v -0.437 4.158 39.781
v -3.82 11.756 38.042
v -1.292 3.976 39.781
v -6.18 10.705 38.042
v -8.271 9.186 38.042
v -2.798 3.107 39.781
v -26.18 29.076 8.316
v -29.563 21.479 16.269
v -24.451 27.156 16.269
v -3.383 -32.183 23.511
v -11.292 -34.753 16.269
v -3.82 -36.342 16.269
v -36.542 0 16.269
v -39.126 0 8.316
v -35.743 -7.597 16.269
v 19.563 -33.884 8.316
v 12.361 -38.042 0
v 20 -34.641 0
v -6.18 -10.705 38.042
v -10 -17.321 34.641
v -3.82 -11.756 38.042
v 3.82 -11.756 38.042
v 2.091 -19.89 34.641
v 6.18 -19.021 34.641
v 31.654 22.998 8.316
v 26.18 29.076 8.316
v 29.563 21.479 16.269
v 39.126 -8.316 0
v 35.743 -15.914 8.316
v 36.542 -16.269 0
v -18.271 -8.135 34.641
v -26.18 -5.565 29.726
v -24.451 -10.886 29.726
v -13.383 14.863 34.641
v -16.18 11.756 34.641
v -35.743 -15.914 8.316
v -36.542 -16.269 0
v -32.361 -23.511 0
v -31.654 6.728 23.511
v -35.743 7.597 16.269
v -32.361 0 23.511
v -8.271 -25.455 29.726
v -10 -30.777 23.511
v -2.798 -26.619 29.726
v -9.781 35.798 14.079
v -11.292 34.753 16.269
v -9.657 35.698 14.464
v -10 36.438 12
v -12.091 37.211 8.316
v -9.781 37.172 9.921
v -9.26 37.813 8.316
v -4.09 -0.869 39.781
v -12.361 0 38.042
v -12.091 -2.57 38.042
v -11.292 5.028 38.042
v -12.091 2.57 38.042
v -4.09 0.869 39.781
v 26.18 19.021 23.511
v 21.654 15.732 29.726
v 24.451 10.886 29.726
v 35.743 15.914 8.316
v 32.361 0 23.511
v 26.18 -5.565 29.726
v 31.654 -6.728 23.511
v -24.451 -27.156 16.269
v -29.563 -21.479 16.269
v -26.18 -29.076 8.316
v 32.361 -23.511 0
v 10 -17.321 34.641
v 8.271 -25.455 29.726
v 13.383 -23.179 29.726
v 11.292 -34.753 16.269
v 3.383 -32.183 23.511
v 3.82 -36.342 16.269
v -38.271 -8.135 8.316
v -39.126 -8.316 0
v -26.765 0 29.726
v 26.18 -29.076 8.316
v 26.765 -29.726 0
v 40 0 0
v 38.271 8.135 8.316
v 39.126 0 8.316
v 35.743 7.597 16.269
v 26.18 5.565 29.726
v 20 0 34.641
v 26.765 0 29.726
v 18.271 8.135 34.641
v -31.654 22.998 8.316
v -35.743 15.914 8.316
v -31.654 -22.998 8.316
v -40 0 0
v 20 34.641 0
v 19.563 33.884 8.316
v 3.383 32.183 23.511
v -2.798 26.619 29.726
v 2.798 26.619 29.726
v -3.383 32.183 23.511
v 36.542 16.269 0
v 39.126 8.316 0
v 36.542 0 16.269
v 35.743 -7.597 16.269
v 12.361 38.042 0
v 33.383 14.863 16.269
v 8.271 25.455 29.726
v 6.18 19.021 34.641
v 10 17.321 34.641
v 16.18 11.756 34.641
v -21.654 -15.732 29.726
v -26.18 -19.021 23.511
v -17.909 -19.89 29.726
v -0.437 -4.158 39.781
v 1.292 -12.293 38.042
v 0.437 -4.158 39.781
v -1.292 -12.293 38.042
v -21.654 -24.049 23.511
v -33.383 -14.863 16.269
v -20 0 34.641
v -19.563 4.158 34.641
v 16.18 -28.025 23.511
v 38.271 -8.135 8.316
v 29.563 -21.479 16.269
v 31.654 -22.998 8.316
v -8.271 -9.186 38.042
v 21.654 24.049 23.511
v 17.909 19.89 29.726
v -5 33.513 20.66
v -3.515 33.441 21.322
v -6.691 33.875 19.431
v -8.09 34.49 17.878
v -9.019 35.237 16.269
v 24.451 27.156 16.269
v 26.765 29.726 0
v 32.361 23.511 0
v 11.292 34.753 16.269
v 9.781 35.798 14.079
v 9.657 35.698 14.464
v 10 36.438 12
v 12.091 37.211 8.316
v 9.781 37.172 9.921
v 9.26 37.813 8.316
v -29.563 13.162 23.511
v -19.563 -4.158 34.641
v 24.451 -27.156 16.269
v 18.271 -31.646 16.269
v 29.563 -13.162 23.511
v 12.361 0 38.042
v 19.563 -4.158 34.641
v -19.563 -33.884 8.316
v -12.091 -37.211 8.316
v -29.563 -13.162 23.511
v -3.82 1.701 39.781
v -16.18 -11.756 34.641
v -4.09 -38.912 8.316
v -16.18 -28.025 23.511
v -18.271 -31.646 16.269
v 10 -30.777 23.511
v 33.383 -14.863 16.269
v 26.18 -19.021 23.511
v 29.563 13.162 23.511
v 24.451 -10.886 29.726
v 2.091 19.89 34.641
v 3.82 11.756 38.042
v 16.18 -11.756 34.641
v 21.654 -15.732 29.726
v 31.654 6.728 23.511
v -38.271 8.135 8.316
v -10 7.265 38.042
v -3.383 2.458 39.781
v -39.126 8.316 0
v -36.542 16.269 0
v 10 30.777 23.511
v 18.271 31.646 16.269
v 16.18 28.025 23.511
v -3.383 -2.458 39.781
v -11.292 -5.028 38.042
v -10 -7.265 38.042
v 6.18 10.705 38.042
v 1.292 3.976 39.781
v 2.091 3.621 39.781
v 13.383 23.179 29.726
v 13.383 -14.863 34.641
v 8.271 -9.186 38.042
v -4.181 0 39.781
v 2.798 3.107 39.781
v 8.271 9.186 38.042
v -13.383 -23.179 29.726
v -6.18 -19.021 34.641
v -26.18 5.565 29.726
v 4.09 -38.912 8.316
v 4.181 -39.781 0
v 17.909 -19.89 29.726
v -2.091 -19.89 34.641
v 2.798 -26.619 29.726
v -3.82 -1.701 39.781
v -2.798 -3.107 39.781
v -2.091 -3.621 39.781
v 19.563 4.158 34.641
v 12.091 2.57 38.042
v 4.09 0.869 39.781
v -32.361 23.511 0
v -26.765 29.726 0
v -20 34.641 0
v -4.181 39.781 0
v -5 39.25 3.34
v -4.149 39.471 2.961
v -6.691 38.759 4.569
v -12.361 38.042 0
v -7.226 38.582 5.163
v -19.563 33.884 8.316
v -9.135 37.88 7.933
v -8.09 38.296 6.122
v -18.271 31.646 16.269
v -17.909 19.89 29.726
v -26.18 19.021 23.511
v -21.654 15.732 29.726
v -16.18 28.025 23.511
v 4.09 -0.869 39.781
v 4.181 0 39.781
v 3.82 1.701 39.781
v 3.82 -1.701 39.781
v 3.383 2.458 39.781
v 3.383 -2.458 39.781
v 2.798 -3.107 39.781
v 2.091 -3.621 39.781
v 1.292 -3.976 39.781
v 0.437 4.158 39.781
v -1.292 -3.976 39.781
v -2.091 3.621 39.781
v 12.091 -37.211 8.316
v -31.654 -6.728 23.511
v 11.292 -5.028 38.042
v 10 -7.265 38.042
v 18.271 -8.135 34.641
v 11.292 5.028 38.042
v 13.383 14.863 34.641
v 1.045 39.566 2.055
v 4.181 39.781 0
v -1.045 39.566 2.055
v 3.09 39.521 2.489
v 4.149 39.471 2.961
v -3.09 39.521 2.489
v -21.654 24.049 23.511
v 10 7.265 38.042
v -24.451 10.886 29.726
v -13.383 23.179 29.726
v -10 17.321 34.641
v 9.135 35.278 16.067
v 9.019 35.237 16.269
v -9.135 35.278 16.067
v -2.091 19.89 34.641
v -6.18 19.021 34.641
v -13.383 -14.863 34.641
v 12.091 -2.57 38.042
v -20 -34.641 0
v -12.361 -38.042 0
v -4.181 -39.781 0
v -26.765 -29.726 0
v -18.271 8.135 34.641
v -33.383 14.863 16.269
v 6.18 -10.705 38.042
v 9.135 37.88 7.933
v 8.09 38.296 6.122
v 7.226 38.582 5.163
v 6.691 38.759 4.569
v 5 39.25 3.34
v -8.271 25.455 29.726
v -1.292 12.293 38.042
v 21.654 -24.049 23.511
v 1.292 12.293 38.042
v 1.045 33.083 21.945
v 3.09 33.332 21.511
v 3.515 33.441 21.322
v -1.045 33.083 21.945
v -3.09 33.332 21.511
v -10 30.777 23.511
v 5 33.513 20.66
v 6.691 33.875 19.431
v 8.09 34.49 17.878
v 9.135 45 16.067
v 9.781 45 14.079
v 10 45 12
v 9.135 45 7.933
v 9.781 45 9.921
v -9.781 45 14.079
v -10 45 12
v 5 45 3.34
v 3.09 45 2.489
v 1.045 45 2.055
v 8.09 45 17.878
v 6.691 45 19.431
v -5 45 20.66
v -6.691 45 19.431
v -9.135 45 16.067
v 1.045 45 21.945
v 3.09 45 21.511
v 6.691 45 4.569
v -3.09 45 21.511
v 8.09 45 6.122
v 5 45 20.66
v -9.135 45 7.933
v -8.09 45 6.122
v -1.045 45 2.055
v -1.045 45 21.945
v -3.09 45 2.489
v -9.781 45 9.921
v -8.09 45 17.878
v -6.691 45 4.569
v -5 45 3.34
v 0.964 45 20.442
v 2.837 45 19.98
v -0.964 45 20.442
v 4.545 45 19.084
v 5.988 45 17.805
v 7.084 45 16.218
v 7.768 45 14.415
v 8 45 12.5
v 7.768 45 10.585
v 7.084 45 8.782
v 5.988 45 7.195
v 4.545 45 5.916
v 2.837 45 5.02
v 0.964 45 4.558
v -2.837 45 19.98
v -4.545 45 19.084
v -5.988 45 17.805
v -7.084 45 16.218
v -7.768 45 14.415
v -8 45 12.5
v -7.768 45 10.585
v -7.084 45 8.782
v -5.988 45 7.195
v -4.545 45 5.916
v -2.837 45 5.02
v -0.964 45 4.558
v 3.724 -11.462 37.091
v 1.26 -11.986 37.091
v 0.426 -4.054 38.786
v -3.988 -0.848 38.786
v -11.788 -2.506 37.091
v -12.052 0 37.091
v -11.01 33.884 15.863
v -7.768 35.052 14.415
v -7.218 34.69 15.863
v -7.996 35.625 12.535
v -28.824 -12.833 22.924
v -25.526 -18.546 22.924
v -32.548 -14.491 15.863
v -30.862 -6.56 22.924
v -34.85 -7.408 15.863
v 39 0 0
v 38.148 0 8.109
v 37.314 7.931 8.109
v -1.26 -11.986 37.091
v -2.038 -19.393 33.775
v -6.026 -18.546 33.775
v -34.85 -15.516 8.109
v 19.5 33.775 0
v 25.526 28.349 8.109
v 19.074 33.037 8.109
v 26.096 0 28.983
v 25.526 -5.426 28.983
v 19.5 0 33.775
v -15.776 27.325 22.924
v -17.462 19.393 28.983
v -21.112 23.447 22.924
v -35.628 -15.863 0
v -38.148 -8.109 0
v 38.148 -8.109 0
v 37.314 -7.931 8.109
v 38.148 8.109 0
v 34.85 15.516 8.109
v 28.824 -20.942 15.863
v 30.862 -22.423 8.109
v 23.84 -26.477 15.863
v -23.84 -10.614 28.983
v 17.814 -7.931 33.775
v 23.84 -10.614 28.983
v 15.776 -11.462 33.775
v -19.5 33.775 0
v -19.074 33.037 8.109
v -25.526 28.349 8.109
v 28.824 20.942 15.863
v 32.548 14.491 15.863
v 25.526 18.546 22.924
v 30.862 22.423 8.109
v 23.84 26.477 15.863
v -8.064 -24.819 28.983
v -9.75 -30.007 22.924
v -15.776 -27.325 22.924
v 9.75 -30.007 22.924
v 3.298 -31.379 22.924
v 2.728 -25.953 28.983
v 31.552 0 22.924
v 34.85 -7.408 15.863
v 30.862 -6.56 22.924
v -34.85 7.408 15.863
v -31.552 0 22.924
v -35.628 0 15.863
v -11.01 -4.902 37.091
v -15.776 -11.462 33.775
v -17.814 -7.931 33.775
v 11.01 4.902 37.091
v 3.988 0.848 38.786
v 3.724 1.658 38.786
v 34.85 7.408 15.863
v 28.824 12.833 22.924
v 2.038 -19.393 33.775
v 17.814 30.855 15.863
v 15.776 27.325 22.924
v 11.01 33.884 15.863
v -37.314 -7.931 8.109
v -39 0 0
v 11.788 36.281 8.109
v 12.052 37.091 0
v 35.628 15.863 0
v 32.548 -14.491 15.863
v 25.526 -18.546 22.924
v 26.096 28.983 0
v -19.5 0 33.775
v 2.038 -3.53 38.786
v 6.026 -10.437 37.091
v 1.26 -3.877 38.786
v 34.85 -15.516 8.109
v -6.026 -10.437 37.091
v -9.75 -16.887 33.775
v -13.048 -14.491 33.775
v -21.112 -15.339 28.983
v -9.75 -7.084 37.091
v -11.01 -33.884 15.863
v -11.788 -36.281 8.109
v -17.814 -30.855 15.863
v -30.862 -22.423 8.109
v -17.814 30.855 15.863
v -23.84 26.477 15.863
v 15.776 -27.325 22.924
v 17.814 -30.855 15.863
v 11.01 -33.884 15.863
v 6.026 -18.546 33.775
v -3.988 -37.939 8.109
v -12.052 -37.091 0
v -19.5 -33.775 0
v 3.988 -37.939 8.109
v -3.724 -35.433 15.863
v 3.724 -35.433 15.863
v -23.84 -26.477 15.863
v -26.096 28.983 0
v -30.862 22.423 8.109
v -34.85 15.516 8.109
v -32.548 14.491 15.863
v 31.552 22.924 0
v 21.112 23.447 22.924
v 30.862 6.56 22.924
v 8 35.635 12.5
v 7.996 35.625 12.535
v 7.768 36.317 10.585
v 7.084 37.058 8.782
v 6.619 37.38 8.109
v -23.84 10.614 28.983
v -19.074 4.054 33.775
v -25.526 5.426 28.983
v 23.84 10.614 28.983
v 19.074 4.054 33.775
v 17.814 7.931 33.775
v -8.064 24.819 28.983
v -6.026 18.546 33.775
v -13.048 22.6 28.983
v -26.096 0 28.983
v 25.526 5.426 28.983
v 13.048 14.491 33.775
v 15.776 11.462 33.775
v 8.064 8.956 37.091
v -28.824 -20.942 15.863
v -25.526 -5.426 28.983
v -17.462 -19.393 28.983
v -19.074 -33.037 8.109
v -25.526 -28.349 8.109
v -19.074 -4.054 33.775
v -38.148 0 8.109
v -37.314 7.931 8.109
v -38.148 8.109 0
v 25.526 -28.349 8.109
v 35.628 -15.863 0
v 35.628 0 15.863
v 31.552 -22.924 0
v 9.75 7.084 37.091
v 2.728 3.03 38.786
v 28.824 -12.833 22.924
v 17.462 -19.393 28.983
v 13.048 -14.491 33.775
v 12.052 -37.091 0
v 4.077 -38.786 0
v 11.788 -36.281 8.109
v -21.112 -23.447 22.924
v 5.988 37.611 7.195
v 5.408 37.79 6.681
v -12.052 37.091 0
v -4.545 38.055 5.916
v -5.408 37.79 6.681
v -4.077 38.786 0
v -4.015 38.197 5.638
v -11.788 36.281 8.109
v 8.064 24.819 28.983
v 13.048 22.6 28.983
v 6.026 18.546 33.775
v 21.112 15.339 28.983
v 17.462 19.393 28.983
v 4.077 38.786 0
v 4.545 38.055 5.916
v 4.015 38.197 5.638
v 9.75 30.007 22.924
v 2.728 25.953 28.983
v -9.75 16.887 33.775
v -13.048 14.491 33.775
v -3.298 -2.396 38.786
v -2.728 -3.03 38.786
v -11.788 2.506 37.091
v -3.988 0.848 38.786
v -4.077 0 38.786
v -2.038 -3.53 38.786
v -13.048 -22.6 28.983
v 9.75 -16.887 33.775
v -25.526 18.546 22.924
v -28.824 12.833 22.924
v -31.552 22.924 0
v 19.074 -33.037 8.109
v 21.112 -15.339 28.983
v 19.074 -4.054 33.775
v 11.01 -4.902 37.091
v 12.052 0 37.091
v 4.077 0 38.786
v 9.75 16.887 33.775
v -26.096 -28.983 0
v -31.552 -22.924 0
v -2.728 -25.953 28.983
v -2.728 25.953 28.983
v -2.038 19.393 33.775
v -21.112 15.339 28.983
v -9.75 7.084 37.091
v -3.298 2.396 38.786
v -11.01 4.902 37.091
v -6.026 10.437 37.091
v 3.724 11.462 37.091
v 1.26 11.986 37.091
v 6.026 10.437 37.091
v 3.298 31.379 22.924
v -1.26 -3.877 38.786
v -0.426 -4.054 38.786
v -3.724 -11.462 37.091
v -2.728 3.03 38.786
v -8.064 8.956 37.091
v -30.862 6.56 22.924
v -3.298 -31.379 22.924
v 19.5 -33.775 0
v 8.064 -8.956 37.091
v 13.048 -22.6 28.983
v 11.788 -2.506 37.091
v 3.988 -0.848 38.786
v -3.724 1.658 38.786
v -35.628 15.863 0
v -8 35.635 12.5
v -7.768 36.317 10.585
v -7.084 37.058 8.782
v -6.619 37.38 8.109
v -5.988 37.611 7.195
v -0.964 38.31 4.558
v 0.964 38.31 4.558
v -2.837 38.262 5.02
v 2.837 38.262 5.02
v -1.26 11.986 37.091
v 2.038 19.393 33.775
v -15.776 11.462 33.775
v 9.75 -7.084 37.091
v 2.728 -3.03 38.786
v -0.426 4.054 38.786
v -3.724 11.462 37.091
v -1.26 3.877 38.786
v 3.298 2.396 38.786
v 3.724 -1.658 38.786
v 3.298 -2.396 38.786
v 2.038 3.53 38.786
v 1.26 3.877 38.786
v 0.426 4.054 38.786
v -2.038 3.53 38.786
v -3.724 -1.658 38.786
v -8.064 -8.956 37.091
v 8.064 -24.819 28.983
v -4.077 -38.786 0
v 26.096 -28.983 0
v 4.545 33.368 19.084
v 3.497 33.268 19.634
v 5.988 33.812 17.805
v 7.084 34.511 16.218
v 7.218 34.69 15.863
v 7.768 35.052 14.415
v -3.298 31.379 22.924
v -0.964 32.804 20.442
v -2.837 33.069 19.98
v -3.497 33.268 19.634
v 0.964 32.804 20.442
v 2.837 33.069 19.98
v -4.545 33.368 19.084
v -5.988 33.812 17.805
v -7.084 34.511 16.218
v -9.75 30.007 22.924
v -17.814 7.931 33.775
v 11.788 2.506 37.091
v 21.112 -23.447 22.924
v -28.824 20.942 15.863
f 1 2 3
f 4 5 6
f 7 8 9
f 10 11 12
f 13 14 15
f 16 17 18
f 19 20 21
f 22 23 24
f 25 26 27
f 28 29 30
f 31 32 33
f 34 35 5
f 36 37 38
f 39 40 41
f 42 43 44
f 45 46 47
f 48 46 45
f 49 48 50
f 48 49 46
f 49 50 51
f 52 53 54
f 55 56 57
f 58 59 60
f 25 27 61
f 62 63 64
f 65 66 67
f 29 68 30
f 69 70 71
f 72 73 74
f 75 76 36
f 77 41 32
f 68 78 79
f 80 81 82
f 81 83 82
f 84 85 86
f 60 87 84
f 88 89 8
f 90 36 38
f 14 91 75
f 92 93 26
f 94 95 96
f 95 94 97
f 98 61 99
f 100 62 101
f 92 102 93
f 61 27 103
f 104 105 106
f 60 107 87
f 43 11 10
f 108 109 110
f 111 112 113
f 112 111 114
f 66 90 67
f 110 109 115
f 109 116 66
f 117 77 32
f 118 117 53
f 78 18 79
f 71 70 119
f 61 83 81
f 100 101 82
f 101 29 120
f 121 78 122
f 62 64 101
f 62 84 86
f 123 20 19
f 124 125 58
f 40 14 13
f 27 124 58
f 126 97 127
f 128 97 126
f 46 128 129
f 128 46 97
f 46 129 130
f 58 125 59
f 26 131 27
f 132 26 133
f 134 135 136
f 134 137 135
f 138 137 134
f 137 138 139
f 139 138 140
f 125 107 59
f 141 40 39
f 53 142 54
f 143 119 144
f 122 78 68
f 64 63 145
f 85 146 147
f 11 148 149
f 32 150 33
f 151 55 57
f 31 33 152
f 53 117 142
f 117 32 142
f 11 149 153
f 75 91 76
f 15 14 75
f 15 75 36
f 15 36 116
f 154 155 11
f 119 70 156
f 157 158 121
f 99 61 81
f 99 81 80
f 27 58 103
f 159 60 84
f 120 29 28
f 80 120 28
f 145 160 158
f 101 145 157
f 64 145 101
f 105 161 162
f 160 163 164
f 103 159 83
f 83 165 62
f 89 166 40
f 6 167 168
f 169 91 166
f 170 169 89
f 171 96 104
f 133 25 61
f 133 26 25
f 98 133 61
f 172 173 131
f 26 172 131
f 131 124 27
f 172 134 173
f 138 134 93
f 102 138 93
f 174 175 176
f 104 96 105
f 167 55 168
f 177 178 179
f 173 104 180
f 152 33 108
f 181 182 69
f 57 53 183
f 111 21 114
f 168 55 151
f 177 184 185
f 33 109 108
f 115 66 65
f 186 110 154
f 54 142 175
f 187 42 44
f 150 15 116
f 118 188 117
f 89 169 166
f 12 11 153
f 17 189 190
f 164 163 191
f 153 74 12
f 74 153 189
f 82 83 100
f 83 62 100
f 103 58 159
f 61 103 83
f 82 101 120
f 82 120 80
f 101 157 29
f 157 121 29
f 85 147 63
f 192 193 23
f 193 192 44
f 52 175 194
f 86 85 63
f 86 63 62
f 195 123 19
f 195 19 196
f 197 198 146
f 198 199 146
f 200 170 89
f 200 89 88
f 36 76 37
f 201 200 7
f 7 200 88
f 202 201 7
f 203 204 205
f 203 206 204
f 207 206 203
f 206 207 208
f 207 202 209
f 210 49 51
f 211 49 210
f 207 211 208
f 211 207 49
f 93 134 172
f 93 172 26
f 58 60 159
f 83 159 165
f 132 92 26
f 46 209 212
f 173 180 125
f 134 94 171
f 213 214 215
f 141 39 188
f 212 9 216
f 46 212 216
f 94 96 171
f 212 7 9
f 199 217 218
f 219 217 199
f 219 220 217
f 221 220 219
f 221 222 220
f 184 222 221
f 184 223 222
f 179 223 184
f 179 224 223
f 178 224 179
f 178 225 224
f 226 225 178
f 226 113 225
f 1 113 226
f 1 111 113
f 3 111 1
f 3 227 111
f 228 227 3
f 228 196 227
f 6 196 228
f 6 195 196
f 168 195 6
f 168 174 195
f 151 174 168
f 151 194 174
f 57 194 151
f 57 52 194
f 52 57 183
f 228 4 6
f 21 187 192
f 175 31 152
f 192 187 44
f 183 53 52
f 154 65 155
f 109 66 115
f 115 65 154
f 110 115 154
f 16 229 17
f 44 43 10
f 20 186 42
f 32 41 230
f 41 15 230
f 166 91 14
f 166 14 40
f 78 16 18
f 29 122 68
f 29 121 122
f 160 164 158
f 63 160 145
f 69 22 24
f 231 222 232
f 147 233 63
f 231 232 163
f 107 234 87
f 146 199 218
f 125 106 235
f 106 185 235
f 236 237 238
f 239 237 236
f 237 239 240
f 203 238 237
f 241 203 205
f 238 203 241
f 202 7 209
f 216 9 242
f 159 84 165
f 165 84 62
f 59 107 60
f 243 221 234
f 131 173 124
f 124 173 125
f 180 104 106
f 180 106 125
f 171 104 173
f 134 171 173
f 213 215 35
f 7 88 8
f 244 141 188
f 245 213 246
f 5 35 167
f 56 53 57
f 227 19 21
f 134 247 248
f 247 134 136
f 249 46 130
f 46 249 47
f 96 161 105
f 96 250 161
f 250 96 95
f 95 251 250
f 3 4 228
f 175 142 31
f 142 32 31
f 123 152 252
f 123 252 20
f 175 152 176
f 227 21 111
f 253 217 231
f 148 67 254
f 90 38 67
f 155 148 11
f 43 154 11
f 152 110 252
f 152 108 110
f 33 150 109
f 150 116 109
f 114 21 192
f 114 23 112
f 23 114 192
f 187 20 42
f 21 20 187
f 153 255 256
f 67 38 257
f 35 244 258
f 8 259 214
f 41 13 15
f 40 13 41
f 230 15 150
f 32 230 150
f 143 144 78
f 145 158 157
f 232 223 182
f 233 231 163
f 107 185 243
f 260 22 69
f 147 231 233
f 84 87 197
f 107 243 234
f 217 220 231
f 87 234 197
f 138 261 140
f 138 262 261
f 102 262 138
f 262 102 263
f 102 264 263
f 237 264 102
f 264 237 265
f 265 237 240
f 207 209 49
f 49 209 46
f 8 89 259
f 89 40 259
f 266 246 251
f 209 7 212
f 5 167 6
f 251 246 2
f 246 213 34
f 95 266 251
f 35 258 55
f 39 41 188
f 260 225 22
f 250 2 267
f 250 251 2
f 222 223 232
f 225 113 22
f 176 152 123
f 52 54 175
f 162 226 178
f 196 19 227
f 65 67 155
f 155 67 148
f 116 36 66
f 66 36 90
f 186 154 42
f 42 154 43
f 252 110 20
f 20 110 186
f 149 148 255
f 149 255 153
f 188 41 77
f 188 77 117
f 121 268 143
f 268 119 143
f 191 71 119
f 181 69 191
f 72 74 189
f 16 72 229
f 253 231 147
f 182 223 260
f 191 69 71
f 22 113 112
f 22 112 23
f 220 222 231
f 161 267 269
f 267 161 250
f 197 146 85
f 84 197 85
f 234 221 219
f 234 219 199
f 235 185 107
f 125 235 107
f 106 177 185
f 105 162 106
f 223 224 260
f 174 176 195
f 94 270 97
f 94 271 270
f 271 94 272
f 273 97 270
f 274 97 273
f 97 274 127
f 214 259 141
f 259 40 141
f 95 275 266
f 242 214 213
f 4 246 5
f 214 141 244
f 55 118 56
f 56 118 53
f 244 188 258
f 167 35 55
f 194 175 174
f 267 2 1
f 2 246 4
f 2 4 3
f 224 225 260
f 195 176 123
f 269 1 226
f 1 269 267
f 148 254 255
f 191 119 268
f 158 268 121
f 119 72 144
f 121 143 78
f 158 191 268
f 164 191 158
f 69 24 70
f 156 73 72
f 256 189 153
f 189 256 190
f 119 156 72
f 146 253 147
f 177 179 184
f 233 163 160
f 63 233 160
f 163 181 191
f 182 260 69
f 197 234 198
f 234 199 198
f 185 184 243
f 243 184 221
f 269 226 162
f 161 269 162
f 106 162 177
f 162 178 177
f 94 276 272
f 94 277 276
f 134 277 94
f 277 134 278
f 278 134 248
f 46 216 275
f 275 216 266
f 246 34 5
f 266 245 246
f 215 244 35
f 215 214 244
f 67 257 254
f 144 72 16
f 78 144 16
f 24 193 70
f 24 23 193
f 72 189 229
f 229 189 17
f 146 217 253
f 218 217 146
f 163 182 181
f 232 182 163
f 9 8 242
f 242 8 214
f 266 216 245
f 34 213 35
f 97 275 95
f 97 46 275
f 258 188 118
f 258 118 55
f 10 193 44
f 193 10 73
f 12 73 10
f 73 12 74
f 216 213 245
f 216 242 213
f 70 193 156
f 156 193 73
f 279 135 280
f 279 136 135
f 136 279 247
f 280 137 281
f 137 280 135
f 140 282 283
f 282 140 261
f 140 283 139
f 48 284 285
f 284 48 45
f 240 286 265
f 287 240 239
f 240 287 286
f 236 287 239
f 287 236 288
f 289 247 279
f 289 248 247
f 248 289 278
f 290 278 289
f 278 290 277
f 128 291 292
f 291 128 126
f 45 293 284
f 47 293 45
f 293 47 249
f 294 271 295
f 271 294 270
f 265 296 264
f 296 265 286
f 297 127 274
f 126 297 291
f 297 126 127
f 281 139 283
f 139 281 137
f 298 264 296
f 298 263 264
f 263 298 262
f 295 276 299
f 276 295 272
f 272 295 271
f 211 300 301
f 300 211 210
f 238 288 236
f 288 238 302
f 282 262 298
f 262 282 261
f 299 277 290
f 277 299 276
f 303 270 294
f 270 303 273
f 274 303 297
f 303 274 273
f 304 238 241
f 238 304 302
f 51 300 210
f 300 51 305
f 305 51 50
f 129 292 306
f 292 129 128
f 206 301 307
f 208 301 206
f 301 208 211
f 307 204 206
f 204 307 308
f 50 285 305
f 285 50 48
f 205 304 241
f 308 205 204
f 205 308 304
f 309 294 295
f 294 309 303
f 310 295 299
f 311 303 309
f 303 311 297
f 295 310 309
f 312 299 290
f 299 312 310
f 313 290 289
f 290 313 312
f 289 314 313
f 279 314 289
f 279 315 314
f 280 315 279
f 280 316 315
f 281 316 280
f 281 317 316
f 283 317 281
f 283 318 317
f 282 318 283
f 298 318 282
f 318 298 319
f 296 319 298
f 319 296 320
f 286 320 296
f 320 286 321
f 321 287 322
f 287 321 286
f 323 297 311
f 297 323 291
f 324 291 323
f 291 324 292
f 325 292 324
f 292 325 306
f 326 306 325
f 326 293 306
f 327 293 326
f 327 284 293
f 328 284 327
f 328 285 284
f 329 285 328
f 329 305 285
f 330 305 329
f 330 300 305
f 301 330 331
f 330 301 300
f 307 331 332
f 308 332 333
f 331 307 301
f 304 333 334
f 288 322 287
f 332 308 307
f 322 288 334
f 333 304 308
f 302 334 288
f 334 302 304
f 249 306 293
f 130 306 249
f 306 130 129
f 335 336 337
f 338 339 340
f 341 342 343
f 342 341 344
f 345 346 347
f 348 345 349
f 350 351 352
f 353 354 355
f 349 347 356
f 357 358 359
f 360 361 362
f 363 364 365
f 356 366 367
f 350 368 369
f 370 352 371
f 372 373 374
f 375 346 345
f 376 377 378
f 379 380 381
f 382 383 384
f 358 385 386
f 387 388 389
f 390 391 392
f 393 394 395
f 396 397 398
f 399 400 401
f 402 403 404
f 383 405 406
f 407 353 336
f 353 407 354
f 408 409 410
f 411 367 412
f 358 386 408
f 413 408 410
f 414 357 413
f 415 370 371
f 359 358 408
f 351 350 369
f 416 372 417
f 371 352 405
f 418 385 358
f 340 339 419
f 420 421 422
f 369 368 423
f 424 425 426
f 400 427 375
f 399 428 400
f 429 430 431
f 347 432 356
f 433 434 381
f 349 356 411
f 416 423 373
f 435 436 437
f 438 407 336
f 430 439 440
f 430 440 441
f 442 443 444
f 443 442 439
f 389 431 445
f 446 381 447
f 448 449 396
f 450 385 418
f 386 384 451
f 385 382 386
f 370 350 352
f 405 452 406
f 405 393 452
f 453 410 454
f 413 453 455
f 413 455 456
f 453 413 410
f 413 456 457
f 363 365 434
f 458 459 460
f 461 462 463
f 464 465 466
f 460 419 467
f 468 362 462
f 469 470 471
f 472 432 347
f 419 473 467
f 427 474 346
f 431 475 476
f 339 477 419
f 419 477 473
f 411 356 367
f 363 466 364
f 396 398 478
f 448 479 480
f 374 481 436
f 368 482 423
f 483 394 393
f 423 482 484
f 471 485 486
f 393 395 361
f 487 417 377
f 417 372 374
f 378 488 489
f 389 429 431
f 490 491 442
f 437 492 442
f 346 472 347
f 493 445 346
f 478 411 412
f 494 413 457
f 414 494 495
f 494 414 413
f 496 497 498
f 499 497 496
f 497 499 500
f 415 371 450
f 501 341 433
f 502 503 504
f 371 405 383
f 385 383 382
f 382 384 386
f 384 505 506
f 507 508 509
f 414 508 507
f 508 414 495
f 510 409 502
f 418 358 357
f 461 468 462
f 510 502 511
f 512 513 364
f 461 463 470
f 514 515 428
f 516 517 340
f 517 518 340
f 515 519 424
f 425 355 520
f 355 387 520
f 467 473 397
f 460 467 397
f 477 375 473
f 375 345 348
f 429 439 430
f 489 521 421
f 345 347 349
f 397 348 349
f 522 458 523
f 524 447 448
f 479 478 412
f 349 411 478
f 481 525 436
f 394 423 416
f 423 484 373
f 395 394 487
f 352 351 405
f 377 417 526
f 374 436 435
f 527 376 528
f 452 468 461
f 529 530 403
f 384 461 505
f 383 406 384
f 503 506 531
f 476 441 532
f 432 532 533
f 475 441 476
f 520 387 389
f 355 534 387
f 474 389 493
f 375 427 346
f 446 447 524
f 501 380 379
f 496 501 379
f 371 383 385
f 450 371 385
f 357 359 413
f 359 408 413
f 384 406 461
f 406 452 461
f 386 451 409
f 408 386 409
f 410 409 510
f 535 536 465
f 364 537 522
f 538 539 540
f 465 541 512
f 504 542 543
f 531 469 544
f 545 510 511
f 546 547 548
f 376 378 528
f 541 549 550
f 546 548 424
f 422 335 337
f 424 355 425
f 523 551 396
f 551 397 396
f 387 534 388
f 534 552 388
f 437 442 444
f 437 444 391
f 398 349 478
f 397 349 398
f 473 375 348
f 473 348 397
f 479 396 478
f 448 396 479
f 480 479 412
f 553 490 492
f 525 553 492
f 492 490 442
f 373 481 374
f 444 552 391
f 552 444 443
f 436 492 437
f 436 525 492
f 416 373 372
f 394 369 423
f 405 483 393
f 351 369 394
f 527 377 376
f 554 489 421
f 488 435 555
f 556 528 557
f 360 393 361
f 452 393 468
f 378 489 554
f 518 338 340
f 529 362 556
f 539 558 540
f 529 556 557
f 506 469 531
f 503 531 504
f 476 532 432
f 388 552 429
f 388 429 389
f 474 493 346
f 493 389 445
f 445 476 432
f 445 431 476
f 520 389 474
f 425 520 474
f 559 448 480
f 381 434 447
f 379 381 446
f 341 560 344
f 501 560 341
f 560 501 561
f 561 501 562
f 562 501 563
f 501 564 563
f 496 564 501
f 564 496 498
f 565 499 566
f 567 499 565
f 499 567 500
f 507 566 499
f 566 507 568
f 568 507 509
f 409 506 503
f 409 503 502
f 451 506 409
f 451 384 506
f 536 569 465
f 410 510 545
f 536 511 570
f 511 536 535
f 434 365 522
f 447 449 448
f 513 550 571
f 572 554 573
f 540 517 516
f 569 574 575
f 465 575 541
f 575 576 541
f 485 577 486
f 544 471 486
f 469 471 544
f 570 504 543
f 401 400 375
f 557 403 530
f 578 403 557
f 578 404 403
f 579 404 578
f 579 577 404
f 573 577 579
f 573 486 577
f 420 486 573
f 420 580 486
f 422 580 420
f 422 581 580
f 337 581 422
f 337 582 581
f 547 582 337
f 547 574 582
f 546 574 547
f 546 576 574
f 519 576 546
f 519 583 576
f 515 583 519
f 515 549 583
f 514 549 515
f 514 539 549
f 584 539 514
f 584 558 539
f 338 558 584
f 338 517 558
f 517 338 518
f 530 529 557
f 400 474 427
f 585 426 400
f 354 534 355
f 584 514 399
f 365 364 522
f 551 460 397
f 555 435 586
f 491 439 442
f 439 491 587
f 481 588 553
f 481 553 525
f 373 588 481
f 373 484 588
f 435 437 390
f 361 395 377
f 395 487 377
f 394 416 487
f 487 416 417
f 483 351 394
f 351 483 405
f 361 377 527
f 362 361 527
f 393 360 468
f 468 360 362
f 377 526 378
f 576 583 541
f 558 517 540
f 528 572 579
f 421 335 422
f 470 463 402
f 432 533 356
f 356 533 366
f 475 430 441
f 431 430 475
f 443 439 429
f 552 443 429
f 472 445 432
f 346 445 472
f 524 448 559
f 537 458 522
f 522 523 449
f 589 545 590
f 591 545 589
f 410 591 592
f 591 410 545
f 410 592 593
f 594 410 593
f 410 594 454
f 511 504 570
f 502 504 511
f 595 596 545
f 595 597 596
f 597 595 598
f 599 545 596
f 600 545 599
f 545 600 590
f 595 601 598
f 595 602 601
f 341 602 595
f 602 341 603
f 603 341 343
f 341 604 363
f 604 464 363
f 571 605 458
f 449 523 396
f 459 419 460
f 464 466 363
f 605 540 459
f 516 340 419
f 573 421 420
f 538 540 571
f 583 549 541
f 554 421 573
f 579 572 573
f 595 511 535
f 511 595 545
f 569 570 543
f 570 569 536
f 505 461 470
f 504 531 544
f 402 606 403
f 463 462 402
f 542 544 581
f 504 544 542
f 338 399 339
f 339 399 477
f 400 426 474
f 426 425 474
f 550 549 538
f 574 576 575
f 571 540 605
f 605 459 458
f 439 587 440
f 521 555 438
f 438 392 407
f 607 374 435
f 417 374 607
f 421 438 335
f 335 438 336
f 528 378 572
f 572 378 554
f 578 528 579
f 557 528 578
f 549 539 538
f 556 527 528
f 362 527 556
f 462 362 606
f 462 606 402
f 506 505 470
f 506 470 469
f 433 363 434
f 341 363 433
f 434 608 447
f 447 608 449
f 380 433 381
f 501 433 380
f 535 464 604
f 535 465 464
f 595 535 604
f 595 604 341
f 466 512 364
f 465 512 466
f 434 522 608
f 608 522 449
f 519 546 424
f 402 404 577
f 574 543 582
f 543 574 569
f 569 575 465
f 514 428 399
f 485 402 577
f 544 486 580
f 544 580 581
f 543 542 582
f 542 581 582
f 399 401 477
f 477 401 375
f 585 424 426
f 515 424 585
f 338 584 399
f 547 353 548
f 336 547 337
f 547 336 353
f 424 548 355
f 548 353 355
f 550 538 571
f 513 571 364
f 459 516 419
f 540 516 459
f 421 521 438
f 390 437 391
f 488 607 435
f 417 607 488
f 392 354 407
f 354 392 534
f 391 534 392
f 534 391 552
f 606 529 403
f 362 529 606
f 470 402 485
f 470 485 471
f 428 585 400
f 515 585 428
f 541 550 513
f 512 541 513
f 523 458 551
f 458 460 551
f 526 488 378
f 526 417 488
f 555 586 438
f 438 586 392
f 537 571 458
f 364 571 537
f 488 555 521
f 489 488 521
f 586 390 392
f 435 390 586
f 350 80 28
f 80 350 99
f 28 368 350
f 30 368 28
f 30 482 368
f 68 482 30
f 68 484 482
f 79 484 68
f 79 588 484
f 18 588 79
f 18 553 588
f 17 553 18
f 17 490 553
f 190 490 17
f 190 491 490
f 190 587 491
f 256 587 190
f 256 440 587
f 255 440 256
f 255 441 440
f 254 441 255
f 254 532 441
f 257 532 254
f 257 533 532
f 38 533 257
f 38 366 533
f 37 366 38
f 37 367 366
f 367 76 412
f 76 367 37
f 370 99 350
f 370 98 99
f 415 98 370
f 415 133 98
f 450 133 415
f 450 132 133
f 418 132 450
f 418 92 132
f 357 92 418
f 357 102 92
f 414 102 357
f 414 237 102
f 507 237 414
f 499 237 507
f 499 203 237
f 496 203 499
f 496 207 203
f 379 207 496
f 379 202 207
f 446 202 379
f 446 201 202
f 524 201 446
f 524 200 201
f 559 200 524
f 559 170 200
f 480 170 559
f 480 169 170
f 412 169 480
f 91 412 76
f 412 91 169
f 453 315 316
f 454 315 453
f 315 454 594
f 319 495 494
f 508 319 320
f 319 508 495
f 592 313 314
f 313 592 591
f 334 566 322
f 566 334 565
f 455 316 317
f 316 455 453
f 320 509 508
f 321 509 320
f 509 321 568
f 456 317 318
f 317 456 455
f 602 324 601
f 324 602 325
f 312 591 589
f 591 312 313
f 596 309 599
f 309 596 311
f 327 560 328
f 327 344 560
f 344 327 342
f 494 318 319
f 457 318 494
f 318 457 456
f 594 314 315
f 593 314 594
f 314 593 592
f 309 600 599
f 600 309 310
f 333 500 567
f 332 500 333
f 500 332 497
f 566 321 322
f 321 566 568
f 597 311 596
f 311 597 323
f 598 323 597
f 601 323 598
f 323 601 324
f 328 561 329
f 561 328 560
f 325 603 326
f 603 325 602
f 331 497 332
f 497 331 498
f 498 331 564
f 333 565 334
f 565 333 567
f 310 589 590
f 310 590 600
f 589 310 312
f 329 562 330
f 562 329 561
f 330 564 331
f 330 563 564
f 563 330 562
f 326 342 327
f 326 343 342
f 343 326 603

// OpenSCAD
difference()
{
    union(){
        sphere(r=40);
        translate([0,45,12])rotate([90,0,0])cylinder(r=10,h=20);
    }
    sphere(r=39);
    translate([0,0,-20])cube([80,80,40], center=true);
    translate([0,45,12.5])rotate([90,0,0])cylinder(r=8,h=20);
}
